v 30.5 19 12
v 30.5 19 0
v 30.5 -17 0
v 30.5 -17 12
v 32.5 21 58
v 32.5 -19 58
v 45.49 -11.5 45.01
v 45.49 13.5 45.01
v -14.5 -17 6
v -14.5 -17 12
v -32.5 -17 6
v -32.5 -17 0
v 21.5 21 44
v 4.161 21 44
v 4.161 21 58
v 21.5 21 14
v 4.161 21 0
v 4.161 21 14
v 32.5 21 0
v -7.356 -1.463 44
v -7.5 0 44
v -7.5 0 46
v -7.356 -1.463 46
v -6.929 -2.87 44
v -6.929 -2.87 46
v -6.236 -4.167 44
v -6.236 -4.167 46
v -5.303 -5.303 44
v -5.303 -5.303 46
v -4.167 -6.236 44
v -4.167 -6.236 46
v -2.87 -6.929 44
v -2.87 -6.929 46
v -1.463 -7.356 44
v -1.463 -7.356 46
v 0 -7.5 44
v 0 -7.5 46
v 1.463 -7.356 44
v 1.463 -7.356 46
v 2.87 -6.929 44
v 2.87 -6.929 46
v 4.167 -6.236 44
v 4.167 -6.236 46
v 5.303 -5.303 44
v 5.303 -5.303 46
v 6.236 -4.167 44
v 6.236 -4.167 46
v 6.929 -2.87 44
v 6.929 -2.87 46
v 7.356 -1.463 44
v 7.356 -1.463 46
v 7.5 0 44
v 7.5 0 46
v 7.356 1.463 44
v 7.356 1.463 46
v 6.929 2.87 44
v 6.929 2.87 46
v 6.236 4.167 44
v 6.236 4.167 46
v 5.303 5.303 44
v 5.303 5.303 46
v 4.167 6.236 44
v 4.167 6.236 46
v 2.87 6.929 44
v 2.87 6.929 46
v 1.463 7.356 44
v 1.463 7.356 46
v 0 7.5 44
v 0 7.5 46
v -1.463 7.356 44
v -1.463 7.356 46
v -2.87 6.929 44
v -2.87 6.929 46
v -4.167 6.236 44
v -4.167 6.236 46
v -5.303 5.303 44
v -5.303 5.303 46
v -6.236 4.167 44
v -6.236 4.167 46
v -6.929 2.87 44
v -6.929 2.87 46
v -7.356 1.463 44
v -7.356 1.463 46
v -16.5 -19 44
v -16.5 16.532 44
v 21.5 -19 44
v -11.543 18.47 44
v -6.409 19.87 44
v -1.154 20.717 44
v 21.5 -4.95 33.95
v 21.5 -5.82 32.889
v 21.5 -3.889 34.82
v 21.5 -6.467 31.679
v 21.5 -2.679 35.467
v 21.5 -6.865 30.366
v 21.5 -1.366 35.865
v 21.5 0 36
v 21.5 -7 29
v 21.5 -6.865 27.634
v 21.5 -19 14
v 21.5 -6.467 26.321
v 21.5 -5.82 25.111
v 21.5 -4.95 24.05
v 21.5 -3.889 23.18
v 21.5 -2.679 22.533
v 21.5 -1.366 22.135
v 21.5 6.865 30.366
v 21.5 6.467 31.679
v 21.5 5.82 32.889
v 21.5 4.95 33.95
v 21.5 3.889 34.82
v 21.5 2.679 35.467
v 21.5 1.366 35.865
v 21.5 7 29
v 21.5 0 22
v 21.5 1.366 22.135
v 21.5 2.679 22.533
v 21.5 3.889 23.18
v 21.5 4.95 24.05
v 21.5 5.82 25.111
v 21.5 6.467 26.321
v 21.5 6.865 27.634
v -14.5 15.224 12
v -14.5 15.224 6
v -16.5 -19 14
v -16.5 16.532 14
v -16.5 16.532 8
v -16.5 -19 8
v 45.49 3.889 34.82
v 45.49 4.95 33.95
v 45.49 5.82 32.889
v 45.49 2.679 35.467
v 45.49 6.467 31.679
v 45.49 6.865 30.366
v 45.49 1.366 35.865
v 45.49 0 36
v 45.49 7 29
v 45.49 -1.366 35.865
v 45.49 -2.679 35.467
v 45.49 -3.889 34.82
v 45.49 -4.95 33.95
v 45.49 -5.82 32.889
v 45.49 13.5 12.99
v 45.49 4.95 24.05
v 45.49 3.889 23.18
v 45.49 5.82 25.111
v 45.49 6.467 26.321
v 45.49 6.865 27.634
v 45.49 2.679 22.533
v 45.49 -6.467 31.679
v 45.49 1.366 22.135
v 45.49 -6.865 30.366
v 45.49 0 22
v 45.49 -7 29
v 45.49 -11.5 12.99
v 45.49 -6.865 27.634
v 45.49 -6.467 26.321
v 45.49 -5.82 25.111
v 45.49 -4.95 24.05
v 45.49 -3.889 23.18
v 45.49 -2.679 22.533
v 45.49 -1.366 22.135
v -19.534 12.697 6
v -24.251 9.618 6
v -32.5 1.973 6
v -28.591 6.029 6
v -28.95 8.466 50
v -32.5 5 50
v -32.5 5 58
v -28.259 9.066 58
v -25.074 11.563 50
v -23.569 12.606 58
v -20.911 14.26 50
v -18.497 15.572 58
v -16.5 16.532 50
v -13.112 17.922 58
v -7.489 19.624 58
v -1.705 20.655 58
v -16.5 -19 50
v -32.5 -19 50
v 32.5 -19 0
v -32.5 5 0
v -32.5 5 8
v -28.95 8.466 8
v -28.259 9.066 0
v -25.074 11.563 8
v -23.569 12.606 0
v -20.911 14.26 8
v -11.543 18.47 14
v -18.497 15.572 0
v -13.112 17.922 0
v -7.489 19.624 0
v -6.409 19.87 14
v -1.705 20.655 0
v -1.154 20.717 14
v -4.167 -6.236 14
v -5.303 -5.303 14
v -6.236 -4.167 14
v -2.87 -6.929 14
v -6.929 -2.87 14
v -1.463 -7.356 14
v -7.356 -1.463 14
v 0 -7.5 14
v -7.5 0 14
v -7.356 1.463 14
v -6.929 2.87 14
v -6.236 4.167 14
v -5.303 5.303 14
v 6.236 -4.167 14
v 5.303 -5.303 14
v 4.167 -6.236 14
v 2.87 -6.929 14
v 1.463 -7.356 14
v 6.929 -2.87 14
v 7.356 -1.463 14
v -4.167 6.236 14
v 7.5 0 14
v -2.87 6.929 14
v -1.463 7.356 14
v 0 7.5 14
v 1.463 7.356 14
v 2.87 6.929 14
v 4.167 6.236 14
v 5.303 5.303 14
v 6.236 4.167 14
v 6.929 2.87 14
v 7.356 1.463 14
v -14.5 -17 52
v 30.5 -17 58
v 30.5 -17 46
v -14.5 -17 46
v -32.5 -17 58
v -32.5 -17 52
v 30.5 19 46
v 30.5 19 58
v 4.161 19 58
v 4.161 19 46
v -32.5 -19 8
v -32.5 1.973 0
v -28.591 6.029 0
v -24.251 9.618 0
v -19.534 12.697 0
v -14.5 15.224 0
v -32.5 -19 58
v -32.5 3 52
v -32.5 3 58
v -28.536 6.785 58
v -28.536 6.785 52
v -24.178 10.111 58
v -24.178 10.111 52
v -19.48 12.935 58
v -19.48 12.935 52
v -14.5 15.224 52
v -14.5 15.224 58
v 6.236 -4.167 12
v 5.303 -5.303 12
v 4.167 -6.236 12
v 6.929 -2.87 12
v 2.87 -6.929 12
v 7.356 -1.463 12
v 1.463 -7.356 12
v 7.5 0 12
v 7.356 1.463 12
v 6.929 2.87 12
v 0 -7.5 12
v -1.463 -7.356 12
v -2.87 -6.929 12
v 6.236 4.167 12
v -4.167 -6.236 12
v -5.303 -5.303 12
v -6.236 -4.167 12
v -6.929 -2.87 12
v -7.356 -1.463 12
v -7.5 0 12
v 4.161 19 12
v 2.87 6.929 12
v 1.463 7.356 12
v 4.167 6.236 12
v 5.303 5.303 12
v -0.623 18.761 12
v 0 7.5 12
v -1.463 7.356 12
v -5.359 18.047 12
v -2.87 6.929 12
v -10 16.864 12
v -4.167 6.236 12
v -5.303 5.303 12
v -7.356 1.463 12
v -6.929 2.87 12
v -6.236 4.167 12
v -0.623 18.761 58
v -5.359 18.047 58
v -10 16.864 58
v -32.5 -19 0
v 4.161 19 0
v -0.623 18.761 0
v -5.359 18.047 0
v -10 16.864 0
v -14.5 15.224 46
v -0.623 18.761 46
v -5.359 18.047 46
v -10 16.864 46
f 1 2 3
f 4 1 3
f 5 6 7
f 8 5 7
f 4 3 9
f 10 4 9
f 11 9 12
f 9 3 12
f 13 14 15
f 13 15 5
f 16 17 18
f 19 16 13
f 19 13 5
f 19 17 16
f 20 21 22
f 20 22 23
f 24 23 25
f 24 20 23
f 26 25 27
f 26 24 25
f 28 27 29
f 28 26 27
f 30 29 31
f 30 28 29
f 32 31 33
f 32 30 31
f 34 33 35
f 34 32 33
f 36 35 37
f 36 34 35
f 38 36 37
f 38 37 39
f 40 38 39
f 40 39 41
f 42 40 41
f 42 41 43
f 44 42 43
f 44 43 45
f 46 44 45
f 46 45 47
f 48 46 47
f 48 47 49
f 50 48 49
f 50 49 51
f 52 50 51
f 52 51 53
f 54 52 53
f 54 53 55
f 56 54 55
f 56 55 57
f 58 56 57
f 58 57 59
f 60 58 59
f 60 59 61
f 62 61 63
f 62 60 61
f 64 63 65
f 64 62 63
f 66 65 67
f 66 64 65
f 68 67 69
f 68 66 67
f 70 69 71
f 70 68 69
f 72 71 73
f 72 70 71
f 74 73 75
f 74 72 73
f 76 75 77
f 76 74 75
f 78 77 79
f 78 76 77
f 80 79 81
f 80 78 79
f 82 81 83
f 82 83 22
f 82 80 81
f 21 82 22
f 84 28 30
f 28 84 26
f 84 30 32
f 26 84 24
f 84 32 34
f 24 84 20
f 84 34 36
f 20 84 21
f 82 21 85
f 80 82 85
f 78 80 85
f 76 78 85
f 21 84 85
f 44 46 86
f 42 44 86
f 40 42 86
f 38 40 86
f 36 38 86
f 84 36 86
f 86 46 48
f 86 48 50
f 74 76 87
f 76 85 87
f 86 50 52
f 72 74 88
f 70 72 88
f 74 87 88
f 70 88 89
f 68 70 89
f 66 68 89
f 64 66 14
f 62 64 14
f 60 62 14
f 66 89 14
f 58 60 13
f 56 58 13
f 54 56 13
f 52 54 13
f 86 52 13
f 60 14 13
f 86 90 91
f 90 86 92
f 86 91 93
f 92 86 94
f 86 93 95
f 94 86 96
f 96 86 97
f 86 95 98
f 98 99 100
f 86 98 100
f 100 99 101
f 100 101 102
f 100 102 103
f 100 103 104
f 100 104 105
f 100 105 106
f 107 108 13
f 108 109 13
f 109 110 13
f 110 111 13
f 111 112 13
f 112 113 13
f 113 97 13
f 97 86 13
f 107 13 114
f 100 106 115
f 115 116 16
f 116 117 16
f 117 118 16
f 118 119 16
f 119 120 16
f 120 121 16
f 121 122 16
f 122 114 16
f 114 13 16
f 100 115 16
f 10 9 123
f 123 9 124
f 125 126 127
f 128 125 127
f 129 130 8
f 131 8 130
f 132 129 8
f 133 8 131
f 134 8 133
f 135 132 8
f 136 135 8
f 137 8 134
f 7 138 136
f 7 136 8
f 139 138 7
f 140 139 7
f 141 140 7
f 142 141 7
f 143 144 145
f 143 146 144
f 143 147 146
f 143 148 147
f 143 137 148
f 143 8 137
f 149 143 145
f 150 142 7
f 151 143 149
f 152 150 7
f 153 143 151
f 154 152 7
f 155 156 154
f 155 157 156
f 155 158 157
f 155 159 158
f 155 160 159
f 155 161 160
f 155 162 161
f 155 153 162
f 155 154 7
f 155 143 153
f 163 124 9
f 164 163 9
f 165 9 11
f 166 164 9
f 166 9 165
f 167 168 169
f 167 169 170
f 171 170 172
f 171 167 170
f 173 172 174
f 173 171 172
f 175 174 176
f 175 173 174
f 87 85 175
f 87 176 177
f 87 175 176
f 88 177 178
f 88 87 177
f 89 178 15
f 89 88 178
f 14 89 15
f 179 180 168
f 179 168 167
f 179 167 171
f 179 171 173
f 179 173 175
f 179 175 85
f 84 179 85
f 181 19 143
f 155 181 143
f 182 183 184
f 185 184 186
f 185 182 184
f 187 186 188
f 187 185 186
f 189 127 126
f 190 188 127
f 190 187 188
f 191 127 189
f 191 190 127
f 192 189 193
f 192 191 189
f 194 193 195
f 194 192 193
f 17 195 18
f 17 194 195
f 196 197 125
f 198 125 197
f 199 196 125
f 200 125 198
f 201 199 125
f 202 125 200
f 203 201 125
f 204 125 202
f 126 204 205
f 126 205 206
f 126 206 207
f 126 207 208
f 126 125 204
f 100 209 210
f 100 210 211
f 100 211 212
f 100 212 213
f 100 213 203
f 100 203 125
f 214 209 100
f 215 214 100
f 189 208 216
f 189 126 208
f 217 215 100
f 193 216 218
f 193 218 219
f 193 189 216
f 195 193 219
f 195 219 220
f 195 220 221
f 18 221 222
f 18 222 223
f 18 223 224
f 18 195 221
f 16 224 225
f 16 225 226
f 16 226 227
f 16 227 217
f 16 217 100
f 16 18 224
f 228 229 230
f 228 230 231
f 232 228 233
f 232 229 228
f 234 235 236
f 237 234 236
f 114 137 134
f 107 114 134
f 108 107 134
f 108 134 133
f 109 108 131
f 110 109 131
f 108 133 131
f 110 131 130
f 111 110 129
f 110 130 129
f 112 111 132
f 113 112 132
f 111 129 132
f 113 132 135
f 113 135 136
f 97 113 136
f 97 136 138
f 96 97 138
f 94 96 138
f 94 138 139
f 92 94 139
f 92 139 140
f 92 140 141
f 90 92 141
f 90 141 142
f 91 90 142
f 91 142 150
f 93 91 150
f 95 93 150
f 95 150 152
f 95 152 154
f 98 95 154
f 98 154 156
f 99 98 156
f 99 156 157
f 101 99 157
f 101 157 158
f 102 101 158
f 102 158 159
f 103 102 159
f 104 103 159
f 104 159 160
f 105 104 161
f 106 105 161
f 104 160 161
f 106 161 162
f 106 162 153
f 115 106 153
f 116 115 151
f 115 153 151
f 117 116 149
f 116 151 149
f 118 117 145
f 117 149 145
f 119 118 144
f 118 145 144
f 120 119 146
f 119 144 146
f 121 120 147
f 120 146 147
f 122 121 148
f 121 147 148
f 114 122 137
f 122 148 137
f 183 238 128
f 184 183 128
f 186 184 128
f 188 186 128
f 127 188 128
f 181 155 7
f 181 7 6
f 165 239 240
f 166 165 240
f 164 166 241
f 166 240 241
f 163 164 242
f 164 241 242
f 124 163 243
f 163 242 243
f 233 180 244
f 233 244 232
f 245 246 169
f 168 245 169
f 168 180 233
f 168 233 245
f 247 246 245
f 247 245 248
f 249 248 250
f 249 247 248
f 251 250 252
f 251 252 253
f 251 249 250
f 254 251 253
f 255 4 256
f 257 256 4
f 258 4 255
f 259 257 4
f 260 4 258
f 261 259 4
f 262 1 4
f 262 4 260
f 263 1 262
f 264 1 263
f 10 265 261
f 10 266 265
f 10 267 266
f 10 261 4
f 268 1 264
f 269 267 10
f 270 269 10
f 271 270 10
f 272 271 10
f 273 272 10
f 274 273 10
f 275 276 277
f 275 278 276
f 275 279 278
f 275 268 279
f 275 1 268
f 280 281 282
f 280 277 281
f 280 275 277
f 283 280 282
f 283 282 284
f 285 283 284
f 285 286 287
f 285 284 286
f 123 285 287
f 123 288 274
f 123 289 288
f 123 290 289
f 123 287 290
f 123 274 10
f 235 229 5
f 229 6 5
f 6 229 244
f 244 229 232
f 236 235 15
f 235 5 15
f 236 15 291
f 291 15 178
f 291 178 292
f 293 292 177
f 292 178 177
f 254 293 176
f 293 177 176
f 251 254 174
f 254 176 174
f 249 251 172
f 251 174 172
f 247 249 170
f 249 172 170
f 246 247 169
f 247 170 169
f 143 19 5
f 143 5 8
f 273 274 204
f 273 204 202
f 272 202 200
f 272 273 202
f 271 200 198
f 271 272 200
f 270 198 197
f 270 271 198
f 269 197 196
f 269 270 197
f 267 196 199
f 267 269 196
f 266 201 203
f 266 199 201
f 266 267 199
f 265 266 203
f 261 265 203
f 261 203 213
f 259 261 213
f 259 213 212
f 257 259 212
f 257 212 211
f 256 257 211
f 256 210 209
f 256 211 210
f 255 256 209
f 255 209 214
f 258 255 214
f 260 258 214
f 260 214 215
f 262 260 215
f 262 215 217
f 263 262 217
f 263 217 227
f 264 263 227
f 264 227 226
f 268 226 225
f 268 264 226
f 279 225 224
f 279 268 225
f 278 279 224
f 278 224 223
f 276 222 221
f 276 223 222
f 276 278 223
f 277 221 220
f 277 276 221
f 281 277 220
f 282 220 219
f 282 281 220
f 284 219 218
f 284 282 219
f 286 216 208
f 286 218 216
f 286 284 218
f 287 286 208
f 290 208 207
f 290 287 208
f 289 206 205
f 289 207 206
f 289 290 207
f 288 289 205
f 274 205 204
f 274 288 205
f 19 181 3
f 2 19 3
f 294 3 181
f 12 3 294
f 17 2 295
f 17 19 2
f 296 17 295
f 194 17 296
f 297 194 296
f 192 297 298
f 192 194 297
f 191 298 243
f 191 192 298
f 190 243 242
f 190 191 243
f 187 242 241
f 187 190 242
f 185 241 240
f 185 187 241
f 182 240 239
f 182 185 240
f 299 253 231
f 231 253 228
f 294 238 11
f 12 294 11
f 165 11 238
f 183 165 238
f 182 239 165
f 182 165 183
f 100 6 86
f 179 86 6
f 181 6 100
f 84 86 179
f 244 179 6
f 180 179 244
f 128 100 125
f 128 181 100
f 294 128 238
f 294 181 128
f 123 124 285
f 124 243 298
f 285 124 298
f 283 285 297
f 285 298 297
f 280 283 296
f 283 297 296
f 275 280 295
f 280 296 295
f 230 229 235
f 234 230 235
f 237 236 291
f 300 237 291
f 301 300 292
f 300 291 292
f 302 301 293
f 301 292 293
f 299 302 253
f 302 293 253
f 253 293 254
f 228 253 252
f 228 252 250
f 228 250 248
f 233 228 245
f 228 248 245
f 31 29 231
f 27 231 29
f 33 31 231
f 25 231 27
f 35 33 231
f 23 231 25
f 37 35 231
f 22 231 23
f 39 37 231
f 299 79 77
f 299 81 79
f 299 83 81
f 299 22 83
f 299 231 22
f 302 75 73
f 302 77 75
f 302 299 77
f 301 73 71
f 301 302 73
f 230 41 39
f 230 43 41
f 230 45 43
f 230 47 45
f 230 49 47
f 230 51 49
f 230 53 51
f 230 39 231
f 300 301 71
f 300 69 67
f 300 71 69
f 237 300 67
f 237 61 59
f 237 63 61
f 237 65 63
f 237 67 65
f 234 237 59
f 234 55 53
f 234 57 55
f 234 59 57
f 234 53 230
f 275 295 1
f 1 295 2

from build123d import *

# Parameters (mm, degrees)
SKETCH1_R               = 7.5
BOSS_EXTRUDE1_DEPTH     = 58
SKETCH2_W               = 38
SKETCH2_H               = 30
CUT_EXTRUDE1_DEPTH      = 84.865217872
CUT_EXTRUDE1_DEPTH_BACK = 84.865217872
SKETCH3_W               = 16
SKETCH3_H               = 6
CUT_EXTRUDE4_DEPTH      = 84.865217872
CUT_EXTRUDE4_DEPTH_BACK = 84.865217872
SKETCH4_R               = 7
CUT_EXTRUDE5_DEPTH      = 100.435906681
CUT_EXTRUDE5_DEPTH_BACK = 100.435906681
CUT_EXTRUDE6_DEPTH      = 84.865217872
CUT_EXTRUDE6_DEPTH_BACK = 84.865217872
SKETCH9_R               = 7.5
CUT_EXTRUDE10_DEPTH     = 12
CUT_EXTRUDE12_DEPTH     = 6
CUT_EXTRUDE13_DEPTH     = 12
CUT_EXTRUDE14_DEPTH     = 6


with BuildPart() as part:
    # Sketch1 → Boss-Extrude1 (new body)
    with BuildSketch(Plane.XY):
        with BuildLine():
            Line((32.5, -19), (-32.5, -19))
            Line((-32.5, -19), (-32.5, 5))
            ThreePointArc((-32.5, 5), (-15.83939444, 16.82575695), (4.16060556, 21))
            Line((4.16060556, 21), (32.5, 21))
            Line((32.5, 21), (45.490381057, 13.5))
            Line((45.490381057, 13.5), (45.490381057, -11.5))
            Line((45.490381057, -11.5), (32.5, -19))
        make_face()
        with Locations(Location((0, 0, 0), (0, 0, 180))):
            Circle(SKETCH1_R, mode=Mode.SUBTRACT)
    extrude(amount=BOSS_EXTRUDE1_DEPTH)

    # Sketch2 → Cut-Extrude1 (cut, two sides)
    with BuildSketch(Plane(origin=(0, 21, 0), x_dir=(1, 0, 0), z_dir=(0, 1, 0))) as cut_extrude1_sk:
        with Locations((2.5, -29)):
            Rectangle(SKETCH2_W, SKETCH2_H)
    extrude(amount=CUT_EXTRUDE1_DEPTH, mode=Mode.SUBTRACT)
    extrude(cut_extrude1_sk.sketch, amount=-CUT_EXTRUDE1_DEPTH_BACK, mode=Mode.SUBTRACT)

    # Sketch3 → Cut-Extrude4 (cut, two sides)
    with BuildSketch(Plane(origin=(0, 21, 0), x_dir=(1, 0, 0), z_dir=(0, 1, 0))) as cut_extrude4_sk:
        with Locations((-24.5, -47)):
            Rectangle(SKETCH3_W, SKETCH3_H)
        with Locations((-24.5, -11)):
            Rectangle(SKETCH3_W, SKETCH3_H)
    extrude(amount=CUT_EXTRUDE4_DEPTH, mode=Mode.SUBTRACT)
    extrude(cut_extrude4_sk.sketch, amount=-CUT_EXTRUDE4_DEPTH_BACK, mode=Mode.SUBTRACT)


with BuildPart() as body_2:
    # of the pieces the cut leaves, the one that is kept (cut_extrude4_keep)
    add(part.part.solids().sort_by_distance((4.16060556, 21, 0))[0])

    # Sketch4 → Cut-Extrude5 (cut, two sides)
    with BuildSketch(Plane(origin=(45.490381057, 0, 0), x_dir=(0, 0, -1), z_dir=(1, 0, 0))) as cut_extrude5_sk:
        with Locations(Location((-29, 0, 0), (0, 0, 90))):
            Circle(SKETCH4_R)
    extrude(amount=CUT_EXTRUDE5_DEPTH, mode=Mode.SUBTRACT)
    extrude(cut_extrude5_sk.sketch, amount=-CUT_EXTRUDE5_DEPTH_BACK, mode=Mode.SUBTRACT)

    # Sketch6 → Cut-Extrude6 (cut, two sides)
    with BuildSketch(Plane(origin=(0, 21, 0), x_dir=(1, 0, 0), z_dir=(0, 1, 0))) as cut_extrude6_sk:
        Polygon((32.5, 0), (45.490381057, -12.990381057), (45.490381057, 0), align=None)
        Polygon((45.490381057, -45.009618943), (45.490381057, -58), (32.5, -58), align=None)
    extrude(amount=CUT_EXTRUDE6_DEPTH, mode=Mode.SUBTRACT)
    extrude(cut_extrude6_sk.sketch, amount=-CUT_EXTRUDE6_DEPTH_BACK, mode=Mode.SUBTRACT)

    # Sketch9 → Cut-Extrude10 (cut)
    with BuildSketch(Plane.XY.offset(58)):
        with BuildLine():
            Line((30.5, 19), (4.16060556, 19))
            ThreePointArc((4.16060556, 19), (-5.358778616, 18.046586751), (-14.5, 15.224221872))
            Line((-14.5, 15.224221872), (-14.5, -17))
            Line((-14.5, -17), (30.5, -17))
            Line((30.5, -17), (30.5, 19))
        make_face()
        with Locations(Location((0, 0, 0), (0, 0, 180))):
            Circle(SKETCH9_R, mode=Mode.SUBTRACT)
    extrude(amount=-CUT_EXTRUDE10_DEPTH, mode=Mode.SUBTRACT)

    # Sketch10 → Cut-Extrude12 (cut)
    with BuildSketch(Plane.XY.offset(58)):
        with BuildLine():
            Line((-14.5, 15.224221872), (-14.5, -17))
            Line((-14.5, -17), (-32.5, -17))
            Line((-32.5, -17), (-32.5, 3))
            ThreePointArc((-32.5, 3), (-24.178137204, 10.110658721), (-14.5, 15.224221872))
        make_face()
    extrude(amount=-CUT_EXTRUDE12_DEPTH, mode=Mode.SUBTRACT)

    # Sketch14 → Cut-Extrude13 (cut)
    with BuildSketch(Plane(origin=(0, 0, 0), x_dir=(-1, 0, 0), z_dir=(0, 0, -1))):
        with BuildLine():
            Line((14.5, -17), (14.5, 15.224221872))
            ThreePointArc((14.5, 15.224221872), (5.358778616, 18.046586751), (-4.16060556, 19))
            Line((-4.16060556, 19), (-30.5, 19))
            Line((-30.5, 19), (-30.5, -17))
            Line((-30.5, -17), (14.5, -17))
        make_face()
    extrude(amount=-CUT_EXTRUDE13_DEPTH, mode=Mode.SUBTRACT)

    # Sketch15 → Cut-Extrude14 (cut)
    with BuildSketch(Plane(origin=(0, 0, 0), x_dir=(-1, 0, 0), z_dir=(0, 0, -1))):
        with BuildLine():
            Line((14.5, 15.224221872), (14.5, -17))
            Line((14.5, -17), (32.5, -17))
            Line((32.5, -17), (32.5, 1.972887098))
            ThreePointArc((32.5, 1.972887098), (24.250830172, 9.618447449), (14.5, 15.224221872))
        make_face()
    extrude(amount=-CUT_EXTRUDE14_DEPTH, mode=Mode.SUBTRACT)


solid = body_2.part
